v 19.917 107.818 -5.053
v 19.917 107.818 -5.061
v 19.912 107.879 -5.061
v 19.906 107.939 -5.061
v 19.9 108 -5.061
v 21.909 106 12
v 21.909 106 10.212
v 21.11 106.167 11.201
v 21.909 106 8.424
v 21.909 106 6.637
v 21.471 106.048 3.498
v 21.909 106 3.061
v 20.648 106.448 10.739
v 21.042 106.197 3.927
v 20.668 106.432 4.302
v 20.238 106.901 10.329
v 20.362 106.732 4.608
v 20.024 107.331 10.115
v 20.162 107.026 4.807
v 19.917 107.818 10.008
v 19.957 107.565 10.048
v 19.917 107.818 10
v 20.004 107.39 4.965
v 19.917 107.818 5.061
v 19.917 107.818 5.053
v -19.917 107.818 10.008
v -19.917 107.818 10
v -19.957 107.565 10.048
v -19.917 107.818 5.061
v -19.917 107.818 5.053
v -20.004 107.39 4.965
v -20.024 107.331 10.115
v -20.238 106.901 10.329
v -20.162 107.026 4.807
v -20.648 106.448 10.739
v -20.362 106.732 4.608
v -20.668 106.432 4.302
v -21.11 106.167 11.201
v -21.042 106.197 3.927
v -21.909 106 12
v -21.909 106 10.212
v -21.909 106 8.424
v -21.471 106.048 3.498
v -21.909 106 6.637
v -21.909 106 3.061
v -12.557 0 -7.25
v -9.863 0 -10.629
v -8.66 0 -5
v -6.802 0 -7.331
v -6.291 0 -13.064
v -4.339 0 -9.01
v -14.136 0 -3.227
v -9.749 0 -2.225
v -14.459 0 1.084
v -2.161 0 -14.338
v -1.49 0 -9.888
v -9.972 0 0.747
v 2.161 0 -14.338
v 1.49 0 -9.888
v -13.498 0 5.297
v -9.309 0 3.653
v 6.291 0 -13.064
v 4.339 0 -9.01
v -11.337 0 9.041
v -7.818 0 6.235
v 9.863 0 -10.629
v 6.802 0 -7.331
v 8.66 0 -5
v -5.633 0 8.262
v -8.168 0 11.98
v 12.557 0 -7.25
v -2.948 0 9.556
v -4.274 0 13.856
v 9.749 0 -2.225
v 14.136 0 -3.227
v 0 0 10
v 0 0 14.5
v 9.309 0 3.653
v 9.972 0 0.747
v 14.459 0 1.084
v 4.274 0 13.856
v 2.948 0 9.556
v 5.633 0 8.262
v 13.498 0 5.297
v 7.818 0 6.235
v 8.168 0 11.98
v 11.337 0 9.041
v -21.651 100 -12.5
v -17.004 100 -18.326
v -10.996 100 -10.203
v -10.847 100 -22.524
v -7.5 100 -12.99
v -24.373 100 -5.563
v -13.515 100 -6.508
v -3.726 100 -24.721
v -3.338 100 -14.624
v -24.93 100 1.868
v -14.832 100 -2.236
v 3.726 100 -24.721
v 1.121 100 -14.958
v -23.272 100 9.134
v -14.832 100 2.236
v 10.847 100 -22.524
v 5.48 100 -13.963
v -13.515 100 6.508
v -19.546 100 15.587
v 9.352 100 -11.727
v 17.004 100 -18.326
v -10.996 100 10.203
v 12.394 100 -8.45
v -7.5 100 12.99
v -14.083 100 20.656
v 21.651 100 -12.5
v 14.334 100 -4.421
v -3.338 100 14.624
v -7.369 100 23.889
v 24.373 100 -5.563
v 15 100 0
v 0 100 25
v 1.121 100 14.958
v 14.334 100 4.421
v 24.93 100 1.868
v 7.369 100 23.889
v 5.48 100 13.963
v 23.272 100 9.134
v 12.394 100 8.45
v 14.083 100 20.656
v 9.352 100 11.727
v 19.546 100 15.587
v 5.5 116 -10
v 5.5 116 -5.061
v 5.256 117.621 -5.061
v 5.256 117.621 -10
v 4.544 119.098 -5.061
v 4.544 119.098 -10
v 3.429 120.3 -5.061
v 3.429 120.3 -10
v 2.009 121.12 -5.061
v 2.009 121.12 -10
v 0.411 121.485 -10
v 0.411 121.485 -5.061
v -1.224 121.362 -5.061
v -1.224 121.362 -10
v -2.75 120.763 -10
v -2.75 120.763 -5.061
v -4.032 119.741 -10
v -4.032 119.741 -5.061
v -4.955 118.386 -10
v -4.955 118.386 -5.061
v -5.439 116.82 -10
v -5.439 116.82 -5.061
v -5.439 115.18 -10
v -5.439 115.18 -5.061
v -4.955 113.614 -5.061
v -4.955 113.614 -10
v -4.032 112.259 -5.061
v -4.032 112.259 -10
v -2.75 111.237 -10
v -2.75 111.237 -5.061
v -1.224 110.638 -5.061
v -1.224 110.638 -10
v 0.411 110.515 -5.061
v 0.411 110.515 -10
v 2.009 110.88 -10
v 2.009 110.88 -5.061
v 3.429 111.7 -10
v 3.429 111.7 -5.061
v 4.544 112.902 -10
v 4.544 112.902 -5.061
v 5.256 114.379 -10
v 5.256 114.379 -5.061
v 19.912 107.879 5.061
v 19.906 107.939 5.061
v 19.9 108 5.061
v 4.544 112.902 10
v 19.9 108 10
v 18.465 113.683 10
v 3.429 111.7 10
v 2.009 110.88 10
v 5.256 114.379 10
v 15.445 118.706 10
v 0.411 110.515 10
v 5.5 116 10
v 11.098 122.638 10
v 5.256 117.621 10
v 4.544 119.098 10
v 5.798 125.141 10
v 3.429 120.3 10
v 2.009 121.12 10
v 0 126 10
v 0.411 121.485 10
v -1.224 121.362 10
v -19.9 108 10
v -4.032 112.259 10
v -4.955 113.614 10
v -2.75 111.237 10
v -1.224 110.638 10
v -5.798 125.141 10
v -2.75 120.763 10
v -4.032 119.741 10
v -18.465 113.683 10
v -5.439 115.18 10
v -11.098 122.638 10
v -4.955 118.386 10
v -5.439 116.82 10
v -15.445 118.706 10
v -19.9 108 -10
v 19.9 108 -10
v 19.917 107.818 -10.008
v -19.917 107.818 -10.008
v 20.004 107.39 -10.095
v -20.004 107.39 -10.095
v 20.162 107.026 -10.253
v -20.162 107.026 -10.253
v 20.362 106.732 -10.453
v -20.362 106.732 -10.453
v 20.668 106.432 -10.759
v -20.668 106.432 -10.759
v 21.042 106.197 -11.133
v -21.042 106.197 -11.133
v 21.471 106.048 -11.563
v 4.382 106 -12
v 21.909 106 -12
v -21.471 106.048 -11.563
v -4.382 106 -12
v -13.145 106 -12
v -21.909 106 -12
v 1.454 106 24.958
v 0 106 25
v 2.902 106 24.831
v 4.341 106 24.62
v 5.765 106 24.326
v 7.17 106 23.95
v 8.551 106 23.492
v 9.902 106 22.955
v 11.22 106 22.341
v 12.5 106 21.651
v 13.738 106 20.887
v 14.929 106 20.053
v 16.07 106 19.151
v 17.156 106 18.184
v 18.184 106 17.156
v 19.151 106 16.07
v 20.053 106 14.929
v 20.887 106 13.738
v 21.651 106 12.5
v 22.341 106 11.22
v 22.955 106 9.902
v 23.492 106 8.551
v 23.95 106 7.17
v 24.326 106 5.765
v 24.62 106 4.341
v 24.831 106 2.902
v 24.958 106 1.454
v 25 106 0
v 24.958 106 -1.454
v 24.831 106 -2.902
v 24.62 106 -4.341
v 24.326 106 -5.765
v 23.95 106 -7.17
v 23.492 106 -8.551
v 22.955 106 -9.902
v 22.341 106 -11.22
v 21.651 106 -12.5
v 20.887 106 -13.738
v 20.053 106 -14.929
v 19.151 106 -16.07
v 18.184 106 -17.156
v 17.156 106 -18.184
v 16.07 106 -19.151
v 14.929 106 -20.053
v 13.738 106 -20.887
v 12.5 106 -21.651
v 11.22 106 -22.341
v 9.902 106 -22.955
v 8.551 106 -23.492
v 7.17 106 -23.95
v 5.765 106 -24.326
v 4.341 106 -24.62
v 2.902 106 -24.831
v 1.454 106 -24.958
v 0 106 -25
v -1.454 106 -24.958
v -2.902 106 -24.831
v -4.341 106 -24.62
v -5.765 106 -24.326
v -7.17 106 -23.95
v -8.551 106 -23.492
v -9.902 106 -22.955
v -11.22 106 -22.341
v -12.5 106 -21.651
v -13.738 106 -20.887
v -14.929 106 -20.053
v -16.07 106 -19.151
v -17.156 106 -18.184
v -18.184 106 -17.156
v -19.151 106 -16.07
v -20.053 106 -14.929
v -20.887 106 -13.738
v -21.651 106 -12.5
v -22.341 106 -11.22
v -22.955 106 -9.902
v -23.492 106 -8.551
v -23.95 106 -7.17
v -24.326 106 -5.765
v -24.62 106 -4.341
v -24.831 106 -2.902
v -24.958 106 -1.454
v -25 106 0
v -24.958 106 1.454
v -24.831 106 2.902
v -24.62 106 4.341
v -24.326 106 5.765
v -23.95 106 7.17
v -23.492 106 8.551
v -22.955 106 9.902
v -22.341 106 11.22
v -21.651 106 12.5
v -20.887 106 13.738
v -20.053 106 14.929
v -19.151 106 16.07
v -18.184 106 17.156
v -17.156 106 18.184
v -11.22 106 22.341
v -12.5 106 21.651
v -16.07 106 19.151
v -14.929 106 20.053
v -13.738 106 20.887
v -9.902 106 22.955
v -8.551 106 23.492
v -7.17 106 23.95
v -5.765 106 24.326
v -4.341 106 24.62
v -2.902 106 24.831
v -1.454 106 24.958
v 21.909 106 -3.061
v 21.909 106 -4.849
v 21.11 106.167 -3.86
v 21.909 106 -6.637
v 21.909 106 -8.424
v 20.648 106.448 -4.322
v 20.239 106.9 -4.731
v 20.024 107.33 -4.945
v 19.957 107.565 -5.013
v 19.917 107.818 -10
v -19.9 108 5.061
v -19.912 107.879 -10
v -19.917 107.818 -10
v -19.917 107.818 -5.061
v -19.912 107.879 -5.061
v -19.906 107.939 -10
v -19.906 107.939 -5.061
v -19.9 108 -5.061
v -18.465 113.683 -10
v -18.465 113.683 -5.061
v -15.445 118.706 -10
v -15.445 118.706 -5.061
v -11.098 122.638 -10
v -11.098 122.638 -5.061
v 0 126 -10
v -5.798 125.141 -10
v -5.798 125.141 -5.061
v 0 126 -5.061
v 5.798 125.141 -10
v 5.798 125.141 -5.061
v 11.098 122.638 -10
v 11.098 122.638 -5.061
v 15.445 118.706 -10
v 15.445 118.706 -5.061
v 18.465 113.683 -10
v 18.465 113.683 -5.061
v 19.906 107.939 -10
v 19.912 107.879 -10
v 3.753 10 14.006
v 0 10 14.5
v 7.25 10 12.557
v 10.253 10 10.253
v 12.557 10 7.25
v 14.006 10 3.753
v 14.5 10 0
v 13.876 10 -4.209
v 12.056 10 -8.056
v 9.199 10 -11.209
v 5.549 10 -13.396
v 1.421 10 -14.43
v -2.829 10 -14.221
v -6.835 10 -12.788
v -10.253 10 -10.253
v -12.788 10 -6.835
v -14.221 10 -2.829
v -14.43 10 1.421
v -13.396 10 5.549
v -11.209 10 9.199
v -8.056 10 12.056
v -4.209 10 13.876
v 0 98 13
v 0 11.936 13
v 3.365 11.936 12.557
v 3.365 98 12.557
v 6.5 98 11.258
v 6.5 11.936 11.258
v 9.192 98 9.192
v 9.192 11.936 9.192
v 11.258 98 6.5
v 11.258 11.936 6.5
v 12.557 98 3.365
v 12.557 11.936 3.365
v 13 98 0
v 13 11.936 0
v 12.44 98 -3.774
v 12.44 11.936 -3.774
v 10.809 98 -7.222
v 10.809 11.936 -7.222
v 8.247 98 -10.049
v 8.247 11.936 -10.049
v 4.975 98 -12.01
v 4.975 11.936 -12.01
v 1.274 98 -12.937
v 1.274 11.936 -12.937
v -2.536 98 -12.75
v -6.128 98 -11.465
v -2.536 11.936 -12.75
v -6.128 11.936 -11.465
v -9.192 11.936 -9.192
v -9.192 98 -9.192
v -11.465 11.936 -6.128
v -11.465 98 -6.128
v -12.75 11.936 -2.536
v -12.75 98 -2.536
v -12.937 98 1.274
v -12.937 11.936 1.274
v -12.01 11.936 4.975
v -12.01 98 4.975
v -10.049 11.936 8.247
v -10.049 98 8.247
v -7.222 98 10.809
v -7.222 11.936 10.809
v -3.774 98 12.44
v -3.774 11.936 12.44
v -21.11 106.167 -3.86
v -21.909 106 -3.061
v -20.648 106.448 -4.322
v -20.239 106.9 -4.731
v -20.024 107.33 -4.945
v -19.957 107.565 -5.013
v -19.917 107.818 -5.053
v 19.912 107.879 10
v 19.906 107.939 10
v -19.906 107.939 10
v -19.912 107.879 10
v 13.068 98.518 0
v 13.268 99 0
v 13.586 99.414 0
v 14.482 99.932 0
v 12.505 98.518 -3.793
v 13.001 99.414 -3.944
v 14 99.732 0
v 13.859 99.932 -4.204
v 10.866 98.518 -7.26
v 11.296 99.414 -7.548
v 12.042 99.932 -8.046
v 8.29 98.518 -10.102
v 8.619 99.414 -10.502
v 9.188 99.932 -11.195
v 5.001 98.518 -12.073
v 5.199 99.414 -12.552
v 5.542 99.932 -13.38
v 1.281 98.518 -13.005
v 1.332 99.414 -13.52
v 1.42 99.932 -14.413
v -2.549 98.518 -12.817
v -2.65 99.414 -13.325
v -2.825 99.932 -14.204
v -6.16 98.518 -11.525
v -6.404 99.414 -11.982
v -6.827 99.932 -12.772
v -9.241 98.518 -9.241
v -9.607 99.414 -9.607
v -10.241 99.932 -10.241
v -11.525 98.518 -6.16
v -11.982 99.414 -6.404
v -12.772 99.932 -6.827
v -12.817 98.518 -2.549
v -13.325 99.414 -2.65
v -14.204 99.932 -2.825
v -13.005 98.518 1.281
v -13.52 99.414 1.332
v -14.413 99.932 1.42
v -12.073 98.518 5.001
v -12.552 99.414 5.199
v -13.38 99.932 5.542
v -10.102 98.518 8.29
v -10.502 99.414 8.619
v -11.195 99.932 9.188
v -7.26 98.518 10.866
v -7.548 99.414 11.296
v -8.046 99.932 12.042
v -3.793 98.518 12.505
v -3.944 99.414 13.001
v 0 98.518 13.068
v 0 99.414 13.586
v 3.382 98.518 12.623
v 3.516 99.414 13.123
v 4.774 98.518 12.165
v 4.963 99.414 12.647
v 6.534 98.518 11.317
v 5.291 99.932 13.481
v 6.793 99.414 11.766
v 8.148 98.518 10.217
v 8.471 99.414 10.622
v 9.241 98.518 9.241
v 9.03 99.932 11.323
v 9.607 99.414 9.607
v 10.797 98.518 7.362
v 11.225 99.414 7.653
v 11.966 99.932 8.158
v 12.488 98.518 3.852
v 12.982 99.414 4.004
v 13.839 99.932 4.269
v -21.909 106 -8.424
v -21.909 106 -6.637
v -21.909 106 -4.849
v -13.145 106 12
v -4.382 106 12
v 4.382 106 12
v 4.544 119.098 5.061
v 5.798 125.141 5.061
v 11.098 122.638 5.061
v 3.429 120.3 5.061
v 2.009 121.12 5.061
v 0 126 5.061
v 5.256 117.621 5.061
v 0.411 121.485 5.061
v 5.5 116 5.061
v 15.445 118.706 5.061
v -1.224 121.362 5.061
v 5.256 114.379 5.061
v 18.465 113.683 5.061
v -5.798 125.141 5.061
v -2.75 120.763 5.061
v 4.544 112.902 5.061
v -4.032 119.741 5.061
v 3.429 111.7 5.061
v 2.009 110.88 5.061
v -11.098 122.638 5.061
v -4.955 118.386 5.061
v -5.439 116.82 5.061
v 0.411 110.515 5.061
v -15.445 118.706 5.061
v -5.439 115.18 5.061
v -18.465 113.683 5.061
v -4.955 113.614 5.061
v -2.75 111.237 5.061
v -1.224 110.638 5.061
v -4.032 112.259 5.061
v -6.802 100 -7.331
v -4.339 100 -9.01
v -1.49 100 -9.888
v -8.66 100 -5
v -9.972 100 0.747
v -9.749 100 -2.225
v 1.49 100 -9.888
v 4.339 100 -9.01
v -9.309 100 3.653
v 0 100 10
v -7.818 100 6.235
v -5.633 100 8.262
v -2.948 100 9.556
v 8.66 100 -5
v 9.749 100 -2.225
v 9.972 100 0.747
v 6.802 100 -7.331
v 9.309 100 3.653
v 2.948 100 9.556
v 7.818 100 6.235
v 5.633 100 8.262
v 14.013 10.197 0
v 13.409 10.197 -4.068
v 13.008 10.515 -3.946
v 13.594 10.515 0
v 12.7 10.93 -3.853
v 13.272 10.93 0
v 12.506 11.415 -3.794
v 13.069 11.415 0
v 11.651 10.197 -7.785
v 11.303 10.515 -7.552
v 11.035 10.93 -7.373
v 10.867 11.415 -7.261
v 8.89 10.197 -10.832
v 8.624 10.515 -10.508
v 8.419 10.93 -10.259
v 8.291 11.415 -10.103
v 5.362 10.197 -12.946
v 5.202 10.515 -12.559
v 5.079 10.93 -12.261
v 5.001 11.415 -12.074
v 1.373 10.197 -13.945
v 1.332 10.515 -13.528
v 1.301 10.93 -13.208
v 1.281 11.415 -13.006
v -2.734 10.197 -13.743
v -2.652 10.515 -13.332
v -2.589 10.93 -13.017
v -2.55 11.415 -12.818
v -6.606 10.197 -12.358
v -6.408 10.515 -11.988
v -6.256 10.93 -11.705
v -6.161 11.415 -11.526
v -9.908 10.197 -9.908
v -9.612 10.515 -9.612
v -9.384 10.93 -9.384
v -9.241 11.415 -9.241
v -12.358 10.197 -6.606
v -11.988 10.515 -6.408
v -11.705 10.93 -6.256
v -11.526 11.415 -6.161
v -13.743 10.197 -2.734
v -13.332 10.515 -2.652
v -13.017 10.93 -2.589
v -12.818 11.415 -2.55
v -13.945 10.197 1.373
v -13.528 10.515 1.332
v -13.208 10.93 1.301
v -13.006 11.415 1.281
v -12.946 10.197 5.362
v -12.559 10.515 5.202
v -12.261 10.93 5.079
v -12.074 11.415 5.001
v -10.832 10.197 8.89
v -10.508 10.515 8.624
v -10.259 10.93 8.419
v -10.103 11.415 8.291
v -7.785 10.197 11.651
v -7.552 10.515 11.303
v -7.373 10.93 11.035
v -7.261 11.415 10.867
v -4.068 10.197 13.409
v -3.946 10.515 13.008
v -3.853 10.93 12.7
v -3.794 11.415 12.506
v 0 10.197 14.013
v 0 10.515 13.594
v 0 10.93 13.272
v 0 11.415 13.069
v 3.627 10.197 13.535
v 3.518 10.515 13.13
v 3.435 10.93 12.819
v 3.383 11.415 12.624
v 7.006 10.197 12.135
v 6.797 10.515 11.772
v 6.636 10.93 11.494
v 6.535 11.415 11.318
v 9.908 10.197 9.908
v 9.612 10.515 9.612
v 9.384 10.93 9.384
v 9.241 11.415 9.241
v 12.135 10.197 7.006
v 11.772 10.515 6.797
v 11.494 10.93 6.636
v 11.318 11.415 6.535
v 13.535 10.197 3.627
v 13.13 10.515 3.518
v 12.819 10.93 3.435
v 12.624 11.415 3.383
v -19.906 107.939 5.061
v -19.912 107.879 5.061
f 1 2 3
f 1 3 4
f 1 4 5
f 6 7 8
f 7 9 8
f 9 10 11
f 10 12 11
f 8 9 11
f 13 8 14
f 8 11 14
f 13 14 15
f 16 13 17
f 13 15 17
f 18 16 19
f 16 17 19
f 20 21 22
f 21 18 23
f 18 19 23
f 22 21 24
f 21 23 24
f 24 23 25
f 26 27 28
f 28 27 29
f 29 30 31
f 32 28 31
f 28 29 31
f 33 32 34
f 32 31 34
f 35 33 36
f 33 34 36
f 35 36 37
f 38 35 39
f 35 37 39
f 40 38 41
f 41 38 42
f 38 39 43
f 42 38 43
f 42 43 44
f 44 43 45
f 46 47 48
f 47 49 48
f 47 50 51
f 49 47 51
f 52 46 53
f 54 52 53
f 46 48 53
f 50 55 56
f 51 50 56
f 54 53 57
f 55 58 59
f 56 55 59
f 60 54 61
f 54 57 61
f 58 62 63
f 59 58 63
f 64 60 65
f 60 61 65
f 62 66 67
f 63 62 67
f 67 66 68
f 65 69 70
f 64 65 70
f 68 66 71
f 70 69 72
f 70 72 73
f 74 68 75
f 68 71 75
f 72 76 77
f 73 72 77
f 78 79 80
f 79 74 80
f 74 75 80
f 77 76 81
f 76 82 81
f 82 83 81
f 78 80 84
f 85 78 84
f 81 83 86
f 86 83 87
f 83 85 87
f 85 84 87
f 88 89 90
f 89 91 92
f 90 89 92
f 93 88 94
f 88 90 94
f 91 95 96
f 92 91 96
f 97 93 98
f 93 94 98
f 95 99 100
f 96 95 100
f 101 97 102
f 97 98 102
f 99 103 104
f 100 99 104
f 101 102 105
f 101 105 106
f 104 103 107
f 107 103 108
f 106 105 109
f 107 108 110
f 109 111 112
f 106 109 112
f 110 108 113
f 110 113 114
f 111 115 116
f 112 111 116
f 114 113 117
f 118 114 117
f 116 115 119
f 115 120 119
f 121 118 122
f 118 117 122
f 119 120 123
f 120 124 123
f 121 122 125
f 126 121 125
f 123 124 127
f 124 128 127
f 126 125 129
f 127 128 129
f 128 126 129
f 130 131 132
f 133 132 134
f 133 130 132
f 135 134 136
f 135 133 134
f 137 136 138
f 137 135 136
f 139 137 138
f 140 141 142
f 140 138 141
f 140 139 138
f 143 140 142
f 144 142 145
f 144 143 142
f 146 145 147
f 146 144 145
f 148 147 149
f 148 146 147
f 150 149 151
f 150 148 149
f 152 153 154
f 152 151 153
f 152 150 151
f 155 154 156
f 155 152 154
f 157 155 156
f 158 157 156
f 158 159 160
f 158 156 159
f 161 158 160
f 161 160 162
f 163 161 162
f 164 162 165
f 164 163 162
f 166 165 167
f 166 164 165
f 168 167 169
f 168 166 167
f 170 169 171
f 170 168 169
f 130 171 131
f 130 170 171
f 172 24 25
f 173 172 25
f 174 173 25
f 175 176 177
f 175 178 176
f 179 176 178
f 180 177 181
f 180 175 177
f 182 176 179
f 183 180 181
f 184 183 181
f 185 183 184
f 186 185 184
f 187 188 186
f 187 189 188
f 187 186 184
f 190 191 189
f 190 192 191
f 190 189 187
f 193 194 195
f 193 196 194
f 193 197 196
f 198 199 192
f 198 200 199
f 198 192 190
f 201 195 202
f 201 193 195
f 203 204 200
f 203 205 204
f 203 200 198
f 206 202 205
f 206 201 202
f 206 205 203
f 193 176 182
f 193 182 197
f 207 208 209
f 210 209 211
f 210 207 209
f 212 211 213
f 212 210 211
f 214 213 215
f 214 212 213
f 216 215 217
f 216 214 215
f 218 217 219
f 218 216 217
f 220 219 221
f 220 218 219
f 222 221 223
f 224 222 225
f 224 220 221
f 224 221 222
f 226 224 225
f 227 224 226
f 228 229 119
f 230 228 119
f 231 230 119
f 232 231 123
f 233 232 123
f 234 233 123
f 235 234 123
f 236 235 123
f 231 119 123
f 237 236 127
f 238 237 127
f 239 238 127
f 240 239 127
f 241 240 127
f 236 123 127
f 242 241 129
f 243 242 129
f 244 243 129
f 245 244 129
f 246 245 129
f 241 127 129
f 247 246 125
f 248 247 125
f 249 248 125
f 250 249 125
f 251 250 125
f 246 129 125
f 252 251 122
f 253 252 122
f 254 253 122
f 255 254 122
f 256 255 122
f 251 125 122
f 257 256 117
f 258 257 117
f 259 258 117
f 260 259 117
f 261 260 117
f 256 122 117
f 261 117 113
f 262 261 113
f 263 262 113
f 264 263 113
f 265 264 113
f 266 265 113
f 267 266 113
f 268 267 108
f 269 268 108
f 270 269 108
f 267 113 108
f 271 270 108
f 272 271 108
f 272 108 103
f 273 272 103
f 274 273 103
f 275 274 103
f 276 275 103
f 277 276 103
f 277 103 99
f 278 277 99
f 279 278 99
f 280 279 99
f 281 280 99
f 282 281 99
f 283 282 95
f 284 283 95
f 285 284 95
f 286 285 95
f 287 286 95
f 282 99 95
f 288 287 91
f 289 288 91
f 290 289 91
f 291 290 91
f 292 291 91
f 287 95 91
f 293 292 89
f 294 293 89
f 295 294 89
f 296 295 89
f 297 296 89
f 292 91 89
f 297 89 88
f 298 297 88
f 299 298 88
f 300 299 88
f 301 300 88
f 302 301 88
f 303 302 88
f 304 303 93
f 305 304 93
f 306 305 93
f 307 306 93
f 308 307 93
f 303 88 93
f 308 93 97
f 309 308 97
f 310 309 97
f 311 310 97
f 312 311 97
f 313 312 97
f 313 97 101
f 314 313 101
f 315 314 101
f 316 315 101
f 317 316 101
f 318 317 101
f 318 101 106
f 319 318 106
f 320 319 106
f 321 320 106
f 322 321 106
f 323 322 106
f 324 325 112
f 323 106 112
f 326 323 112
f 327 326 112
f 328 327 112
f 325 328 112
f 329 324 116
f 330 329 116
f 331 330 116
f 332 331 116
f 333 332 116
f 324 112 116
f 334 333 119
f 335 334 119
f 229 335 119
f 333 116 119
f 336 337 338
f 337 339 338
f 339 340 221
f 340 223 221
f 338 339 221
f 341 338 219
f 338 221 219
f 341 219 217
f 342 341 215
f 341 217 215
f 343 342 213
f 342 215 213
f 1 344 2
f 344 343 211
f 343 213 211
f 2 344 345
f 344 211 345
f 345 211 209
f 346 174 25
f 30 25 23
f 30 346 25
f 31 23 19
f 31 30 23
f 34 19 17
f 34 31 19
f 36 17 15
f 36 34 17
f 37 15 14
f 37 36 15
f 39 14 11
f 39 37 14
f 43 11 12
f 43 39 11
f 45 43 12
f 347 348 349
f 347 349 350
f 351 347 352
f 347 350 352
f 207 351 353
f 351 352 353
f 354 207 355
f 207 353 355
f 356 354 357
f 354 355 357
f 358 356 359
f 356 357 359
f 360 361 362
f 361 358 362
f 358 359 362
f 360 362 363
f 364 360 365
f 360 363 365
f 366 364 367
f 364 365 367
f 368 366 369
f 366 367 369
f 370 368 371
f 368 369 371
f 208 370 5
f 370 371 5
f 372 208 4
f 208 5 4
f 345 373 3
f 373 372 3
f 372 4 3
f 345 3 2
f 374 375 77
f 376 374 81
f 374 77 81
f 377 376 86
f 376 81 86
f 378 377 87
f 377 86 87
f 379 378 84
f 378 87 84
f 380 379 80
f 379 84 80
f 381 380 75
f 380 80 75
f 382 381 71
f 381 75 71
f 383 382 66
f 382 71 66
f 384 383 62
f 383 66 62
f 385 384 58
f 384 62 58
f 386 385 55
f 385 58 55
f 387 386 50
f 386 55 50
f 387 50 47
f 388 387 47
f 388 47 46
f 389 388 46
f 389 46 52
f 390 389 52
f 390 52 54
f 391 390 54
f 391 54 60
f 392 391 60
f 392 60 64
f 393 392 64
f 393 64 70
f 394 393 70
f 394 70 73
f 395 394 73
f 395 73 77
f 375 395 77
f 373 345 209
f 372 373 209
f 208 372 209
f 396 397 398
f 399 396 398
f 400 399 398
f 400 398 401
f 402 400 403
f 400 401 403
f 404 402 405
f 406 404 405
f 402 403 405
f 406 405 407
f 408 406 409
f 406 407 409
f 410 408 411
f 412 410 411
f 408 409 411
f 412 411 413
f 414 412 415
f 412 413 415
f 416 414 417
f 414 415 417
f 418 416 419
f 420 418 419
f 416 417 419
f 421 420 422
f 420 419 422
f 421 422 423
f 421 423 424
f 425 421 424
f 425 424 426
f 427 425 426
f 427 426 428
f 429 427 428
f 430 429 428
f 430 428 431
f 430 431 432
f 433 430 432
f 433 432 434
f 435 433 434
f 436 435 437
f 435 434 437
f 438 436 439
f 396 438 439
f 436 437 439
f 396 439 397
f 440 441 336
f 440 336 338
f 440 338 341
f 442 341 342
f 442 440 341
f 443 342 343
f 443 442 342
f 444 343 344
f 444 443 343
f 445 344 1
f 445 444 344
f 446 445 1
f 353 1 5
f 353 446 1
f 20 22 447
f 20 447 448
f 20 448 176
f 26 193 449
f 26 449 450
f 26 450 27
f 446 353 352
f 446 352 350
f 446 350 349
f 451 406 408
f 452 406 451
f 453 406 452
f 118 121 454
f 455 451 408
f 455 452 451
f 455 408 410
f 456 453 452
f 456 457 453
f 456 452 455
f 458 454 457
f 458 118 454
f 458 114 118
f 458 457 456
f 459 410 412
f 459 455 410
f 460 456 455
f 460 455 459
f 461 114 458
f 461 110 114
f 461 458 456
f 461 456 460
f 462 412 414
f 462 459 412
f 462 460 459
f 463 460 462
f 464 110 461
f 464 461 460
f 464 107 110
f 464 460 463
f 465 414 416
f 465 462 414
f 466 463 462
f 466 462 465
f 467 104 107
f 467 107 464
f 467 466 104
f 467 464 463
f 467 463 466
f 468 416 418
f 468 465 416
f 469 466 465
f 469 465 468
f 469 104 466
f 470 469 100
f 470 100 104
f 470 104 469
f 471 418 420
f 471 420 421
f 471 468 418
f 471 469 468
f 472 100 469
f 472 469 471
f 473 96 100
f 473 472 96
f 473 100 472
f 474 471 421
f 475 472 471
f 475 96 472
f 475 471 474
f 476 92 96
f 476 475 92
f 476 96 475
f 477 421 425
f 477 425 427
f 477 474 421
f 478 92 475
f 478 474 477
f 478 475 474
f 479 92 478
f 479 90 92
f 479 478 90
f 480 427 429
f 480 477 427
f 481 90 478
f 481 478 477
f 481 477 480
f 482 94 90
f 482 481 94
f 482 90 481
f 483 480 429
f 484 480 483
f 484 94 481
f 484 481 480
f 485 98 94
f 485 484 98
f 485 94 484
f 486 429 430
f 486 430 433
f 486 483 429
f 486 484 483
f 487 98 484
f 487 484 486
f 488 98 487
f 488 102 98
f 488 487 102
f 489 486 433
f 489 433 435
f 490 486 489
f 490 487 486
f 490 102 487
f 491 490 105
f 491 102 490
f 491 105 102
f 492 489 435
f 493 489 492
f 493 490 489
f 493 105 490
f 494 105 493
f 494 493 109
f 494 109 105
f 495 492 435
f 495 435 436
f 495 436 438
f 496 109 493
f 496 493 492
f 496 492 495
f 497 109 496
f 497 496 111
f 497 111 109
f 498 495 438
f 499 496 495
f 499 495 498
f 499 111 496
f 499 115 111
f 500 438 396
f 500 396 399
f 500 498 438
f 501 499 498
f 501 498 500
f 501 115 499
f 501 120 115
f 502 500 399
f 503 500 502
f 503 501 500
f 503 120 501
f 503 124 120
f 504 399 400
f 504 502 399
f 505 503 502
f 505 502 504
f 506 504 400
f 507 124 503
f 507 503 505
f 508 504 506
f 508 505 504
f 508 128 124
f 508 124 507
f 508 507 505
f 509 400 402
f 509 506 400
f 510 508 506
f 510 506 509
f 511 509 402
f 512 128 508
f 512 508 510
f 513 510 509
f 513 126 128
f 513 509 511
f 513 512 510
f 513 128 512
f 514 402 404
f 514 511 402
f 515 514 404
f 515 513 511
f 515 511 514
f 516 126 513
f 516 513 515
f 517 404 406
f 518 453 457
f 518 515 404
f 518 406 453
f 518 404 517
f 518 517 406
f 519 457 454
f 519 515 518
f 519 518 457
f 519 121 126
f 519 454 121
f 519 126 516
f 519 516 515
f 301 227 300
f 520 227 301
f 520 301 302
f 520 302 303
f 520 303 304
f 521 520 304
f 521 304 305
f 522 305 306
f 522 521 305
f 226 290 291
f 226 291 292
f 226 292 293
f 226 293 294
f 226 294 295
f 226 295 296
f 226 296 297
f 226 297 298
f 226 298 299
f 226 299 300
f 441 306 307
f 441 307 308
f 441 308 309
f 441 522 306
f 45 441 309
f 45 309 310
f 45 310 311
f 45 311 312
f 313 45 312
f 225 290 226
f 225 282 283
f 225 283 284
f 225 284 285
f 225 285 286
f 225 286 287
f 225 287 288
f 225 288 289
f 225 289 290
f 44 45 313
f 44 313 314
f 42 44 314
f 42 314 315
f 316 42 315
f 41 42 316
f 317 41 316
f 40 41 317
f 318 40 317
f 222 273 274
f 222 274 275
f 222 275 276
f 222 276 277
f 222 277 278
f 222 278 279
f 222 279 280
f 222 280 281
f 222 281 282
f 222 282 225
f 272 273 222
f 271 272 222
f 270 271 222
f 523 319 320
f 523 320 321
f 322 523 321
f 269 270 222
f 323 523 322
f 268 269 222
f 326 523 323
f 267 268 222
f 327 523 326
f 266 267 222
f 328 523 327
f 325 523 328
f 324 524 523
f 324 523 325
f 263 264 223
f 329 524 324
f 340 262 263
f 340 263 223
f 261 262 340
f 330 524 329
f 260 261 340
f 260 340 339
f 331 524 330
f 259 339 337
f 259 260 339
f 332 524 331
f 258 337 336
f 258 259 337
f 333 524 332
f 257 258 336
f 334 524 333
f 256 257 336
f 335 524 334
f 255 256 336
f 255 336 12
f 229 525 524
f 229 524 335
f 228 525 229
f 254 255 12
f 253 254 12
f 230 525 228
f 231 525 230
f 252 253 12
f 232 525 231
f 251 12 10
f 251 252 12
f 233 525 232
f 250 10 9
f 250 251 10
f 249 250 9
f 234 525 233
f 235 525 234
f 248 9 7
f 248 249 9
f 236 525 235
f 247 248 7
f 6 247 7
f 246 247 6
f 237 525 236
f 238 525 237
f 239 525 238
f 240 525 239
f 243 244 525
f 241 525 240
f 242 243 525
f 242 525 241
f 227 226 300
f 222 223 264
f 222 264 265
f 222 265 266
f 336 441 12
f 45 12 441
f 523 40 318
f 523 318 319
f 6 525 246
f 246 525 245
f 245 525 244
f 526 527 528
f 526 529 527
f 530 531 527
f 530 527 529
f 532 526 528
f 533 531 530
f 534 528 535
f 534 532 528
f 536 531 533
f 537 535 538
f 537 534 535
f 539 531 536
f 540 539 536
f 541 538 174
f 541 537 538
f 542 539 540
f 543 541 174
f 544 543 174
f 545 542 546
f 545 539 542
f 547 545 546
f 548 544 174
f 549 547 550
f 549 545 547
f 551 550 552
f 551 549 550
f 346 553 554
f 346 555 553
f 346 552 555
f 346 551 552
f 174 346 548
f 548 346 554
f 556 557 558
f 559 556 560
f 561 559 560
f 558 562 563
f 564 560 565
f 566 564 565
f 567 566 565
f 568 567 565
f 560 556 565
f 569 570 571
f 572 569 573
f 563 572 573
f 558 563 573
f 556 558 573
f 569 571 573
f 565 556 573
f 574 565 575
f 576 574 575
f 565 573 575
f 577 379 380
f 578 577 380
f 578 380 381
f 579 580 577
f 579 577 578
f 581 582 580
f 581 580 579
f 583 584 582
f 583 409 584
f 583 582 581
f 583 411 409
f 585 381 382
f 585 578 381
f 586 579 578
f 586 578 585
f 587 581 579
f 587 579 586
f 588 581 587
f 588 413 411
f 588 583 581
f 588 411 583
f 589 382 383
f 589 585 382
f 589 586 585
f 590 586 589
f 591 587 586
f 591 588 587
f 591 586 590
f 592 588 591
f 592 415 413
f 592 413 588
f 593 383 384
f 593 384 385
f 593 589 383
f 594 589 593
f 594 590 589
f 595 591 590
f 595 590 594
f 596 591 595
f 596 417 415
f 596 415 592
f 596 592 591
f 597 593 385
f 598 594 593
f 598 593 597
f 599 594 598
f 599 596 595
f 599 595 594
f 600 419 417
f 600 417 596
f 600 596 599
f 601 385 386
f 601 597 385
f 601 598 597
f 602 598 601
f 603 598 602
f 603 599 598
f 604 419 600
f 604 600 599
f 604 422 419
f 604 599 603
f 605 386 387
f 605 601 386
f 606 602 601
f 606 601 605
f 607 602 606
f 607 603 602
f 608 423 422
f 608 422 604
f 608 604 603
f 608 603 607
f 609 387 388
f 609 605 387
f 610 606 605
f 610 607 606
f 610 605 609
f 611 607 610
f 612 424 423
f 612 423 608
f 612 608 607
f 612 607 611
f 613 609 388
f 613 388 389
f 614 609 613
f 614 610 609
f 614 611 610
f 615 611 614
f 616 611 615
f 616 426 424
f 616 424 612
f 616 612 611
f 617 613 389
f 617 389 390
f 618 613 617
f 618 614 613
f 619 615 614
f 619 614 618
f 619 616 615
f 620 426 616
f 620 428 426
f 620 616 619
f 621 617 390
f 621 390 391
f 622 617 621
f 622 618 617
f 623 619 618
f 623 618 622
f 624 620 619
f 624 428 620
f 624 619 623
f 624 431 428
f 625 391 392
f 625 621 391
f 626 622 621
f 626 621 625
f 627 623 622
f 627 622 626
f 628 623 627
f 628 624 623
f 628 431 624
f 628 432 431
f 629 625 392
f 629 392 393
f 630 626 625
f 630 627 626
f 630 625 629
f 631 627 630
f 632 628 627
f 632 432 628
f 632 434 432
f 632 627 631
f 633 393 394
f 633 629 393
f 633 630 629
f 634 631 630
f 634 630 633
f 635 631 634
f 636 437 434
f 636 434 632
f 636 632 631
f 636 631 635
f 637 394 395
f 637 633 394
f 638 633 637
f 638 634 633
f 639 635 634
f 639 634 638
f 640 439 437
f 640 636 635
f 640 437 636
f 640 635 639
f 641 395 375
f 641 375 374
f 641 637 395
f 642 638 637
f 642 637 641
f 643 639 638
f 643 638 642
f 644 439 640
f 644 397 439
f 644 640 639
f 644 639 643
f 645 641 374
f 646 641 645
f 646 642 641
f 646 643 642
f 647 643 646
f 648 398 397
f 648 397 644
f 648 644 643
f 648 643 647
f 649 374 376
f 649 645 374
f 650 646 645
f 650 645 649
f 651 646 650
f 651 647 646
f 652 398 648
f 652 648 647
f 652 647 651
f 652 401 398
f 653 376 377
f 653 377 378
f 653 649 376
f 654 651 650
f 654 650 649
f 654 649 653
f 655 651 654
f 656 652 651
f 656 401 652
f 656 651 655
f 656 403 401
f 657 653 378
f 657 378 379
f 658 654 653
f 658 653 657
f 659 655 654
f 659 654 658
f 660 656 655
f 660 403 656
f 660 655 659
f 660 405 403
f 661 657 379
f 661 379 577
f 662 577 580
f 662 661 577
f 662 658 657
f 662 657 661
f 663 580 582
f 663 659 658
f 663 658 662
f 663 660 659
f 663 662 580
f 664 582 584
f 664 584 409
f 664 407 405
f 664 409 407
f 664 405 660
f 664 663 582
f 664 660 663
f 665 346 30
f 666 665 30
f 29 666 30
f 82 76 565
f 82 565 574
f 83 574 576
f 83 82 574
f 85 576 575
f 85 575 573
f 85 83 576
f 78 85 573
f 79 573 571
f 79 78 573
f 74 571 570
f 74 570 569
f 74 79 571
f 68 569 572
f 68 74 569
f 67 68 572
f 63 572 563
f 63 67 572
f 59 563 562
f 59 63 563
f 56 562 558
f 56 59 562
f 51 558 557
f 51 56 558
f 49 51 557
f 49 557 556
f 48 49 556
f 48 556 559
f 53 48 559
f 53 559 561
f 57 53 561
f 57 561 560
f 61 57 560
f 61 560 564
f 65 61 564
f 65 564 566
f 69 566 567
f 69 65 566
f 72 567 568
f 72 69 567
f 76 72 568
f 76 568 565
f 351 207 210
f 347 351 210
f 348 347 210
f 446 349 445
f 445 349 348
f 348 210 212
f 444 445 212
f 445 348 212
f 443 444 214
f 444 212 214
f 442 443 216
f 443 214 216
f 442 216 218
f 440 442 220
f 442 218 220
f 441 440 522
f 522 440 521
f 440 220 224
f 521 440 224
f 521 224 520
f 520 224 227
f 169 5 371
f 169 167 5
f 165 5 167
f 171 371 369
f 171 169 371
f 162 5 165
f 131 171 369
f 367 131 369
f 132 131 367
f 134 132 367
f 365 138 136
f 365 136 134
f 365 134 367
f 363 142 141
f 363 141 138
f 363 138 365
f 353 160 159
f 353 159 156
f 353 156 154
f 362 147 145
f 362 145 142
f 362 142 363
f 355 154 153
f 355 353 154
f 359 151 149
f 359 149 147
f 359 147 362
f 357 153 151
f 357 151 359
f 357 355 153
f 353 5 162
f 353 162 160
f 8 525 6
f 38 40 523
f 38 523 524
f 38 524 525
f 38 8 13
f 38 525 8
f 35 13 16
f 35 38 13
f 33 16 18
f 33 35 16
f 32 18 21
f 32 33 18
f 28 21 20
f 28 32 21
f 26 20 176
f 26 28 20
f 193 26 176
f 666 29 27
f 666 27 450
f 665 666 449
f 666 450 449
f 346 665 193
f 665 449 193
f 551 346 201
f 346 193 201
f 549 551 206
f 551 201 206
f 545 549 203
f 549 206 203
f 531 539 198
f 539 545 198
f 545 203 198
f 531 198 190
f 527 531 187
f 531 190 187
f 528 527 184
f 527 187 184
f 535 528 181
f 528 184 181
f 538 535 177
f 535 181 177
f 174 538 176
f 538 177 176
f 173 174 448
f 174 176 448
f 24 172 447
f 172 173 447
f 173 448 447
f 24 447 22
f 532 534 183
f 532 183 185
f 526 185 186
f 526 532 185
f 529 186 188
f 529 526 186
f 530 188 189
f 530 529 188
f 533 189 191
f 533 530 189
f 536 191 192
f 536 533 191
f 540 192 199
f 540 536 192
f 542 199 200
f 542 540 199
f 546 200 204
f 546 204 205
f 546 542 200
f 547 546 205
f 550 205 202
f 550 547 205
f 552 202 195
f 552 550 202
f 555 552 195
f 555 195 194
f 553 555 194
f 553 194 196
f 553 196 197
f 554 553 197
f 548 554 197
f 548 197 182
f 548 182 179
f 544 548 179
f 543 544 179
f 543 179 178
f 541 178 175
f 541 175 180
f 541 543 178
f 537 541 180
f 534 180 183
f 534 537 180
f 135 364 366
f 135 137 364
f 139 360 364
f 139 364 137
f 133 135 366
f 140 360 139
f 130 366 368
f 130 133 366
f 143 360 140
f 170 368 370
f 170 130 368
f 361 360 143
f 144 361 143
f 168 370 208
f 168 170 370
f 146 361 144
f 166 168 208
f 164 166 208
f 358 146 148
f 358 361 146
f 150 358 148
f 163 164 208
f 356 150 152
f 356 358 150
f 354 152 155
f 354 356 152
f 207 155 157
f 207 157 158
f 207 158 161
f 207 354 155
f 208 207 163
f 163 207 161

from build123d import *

# Parameters (mm, degrees)
SKETCH2_R            = 13
SKETCH2_R_2          = 10
BOSS_EXTRUDE3_DEPTH  = 100
SKETCH2_3_R          = 14.5
SKETCH2_3_R_2        = 13
BOSS_EXTRUDE5_DEPTH  = 10
SKETCH8_R            = 25
BOSS_EXTRUDE7_DEPTH  = 6
SKETCH11_R           = 5.5
BOSS_EXTRUDE12_DEPTH = 10
SKETCH14_W           = 47.941155358
SKETCH14_H           = 10.12177459
CUT_EXTRUDE2_DEPTH   = 112.740771431
FILLET1_START        = -12.0000001
FILLET1_2_DEPTH      = 2.0000001
FILLET1_START_2      = 3.060887195
FILLET1_3_DEPTH      = 2.0000001
FILLET1_START_3      = -5.060887295
FILLET1_4_DEPTH      = 2
FILLET1_START_4      = 10
FILLET1_5_DEPTH      = 2
FILLET1_START_5      = -10
FILLET1_6_DEPTH      = 4.939112705
FILLET1_START_6      = 5.060887295
FILLET1_7_DEPTH      = 4.939112705
FILLET1_START_7      = -21.9089024
FILLET1_8_DEPTH      = 43.8178047


with BuildPart() as part:
    # Sketch2 → Boss-Extrude3 (new body)
    with BuildSketch(Plane(origin=(0, 0, 0), x_dir=(1, 0, 0), z_dir=(0, 1, 0))):
        with Locations(Location((0, 0, 0), (0, 0, 270))):
            Circle(SKETCH2_R)
        with Locations(Location((0, 0, 0), (0, 0, 270))):
            Circle(SKETCH2_R_2, mode=Mode.SUBTRACT)
    extrude(amount=BOSS_EXTRUDE3_DEPTH)

    # Sketch2<3> → Boss-Extrude5 (add)
    with BuildSketch(Plane(origin=(0, 0, 0), x_dir=(1, 0, 0), z_dir=(0, 1, 0))):
        with Locations(Location((0, 0, 0), (0, 0, 270))):
            Circle(SKETCH2_3_R)
        with Locations(Location((0, 0, 0), (0, 0, 270))):
            Circle(SKETCH2_3_R_2, mode=Mode.SUBTRACT)
    extrude(amount=BOSS_EXTRUDE5_DEPTH)

    # Sketch8 → Boss-Extrude7 (add)
    with BuildSketch(Plane(origin=(0, 100, 0), x_dir=(1, 0, 0), z_dir=(0, 1, 0))):
        with Locations(Location((0, 0, 0), (0, 0, 270))):
            Circle(SKETCH8_R)
    extrude(amount=BOSS_EXTRUDE7_DEPTH)

    # Sketch11 → Boss-Extrude12 (add, symmetric)
    with BuildSketch(Plane.XY):
        with BuildLine():
            Line((20, 106), (-20, 106))
            ThreePointArc((-20, 106), (0, 126), (20, 106))
        make_face()
        with Locations((0, 116)):
            Circle(SKETCH11_R, mode=Mode.SUBTRACT)
    extrude(amount=BOSS_EXTRUDE12_DEPTH, both=True)

    # Sketch14 → Cut-Extrude2 (cut, through all)
    with BuildSketch(Plane(origin=(0, 106, 0), x_dir=(1, 0, 0), z_dir=(0, 1, 0))):
        Rectangle(SKETCH14_W, SKETCH14_H)
    extrude(amount=CUT_EXTRUDE2_DEPTH, mode=Mode.SUBTRACT)

    # Fillet1: read off the stored shape, not the designer's step
    # Fillet1 outline → Fillet1 (revolve)
    with BuildSketch(Plane.XY):
        with BuildLine():
            Line((15, 100), (13, 100))
            Line((13, 100), (13, 98))
            ThreePointArc((13, 98), (13.585786438, 99.414213562), (15, 100))
        make_face()
        with BuildLine():
            ThreePointArc((14.5, 10), (13.41886117, 10.711746802), (13, 11.936491673))
            Line((13, 11.936491673), (13, 10))
            Line((13, 10), (14.5, 10))
        make_face()
    revolve(axis=Axis((0, 0, 0), (0, 1, 0)))

    # Fillet1 2 outline → Fillet1 2 (add)
    with BuildSketch(Plane.XY.offset(FILLET1_START)):
        with BuildLine():
            ThreePointArc((21.9089023, 106), (20.560502575, 106.522902108), (19.917183909, 107.818181818))
            ThreePointArc((19.917183909, 107.818181818), (0, 126), (-19.917183909, 107.818181818))
            ThreePointArc((-19.917183909, 107.818181818), (-20.560502575, 106.522902108), (-21.9089023, 106))
            Line((-21.9089023, 106), (21.9089023, 106))
        make_face()
    extrude(amount=FILLET1_2_DEPTH)

    # Fillet1 3 outline → Fillet1 3 (add)
    with BuildSketch(Plane.XY.offset(FILLET1_START_2)):
        with BuildLine():
            ThreePointArc((21.9089023, 106), (20.560502575, 106.522902108), (19.917183909, 107.818181818))
            ThreePointArc((19.917183909, 107.818181818), (0, 126), (-19.917183909, 107.818181818))
            ThreePointArc((-19.917183909, 107.818181818), (-20.560502575, 106.522902108), (-21.9089023, 106))
            Line((-21.9089023, 106), (21.9089023, 106))
        make_face()
    extrude(amount=FILLET1_3_DEPTH)

    # Fillet1 4 outline → Fillet1 4 (add)
    with BuildSketch(Plane.XY.offset(FILLET1_START_3)):
        with BuildLine():
            ThreePointArc((21.9089023, 106), (20.560502575, 106.522902108), (19.917183909, 107.818181818))
            ThreePointArc((19.917183909, 107.818181818), (0, 126), (-19.917183909, 107.818181818))
            ThreePointArc((-19.917183909, 107.818181818), (-20.560502575, 106.522902108), (-21.9089023, 106))
            Line((-21.9089023, 106), (21.9089023, 106))
        make_face()
    extrude(amount=FILLET1_4_DEPTH)

    # Fillet1 5 outline → Fillet1 5 (add)
    with BuildSketch(Plane.XY.offset(FILLET1_START_4)):
        with BuildLine():
            ThreePointArc((21.9089023, 106), (20.560502575, 106.522902108), (19.917183909, 107.818181818))
            ThreePointArc((19.917183909, 107.818181818), (0, 126), (-19.917183909, 107.818181818))
            ThreePointArc((-19.917183909, 107.818181818), (-20.560502575, 106.522902108), (-21.9089023, 106))
            Line((-21.9089023, 106), (21.9089023, 106))
        make_face()
    extrude(amount=FILLET1_5_DEPTH)

    # Fillet1 6 outline → Fillet1 6 (add)
    with BuildSketch(Plane.XY.offset(FILLET1_START_5)):
        with BuildLine():
            Line((20, 106), (21.9089023, 106))
            ThreePointArc((21.9089023, 106), (20.560502575, 106.522902108), (19.917183909, 107.818181818))
            ThreePointArc((19.917183909, 107.818181818), (19.97928525, 106.910033465), (20, 106))
        make_face()
        with BuildLine():
            ThreePointArc((-20, 106), (-19.97928525, 106.910033465), (-19.917183909, 107.818181818))
            ThreePointArc((-19.917183909, 107.818181818), (-20.560502575, 106.522902108), (-21.9089023, 106))
            Line((-21.9089023, 106), (-20, 106))
        make_face()
    extrude(amount=FILLET1_6_DEPTH)

    # Fillet1 7 outline → Fillet1 7 (add)
    with BuildSketch(Plane.XY.offset(FILLET1_START_6)):
        with BuildLine():
            Line((20, 106), (21.9089023, 106))
            ThreePointArc((21.9089023, 106), (20.560502575, 106.522902108), (19.917183909, 107.818181818))
            ThreePointArc((19.917183909, 107.818181818), (19.97928525, 106.910033465), (20, 106))
        make_face()
        with BuildLine():
            ThreePointArc((-20, 106), (-19.97928525, 106.910033465), (-19.917183909, 107.818181818))
            ThreePointArc((-19.917183909, 107.818181818), (-20.560502575, 106.522902108), (-21.9089023, 106))
            Line((-21.9089023, 106), (-20, 106))
        make_face()
    extrude(amount=FILLET1_7_DEPTH)

    # Fillet1 8 outline → Fillet1 8 (cut)
    with BuildSketch(Plane.YZ.offset(FILLET1_START_7)):
        with BuildLine():
            Line((108, 10), (127, 10))
            Line((127, 10), (127, 12))
            Line((127, 12), (106, 12))
            ThreePointArc((106, 12), (106.585786438, 10.585786438), (108, 10))
        make_face()
        with BuildLine():
            Line((127, 3.060887195), (127, 5.060887295))
            Line((127, 5.060887295), (108, 5.060887295))
            ThreePointArc((108, 5.060887295), (106.585786438, 4.475100858), (106, 3.060887295))
            Line((106, 3.060887295), (127, 3.060887195))
        make_face()
        with BuildLine():
            Line((127, -5.060887295), (127, -3.060887295))
            Line((127, -3.060887295), (106, -3.060887295))
            ThreePointArc((106, -3.060887295), (106.585786438, -4.475100858), (108, -5.060887295))
            Line((108, -5.060887295), (127, -5.060887295))
        make_face()
        with BuildLine():
            Line((127, -12.0000001), (127, -10))
            Line((127, -10), (108, -10))
            ThreePointArc((108, -10), (106.585786438, -10.585786438), (106, -12))
            Line((106, -12), (127, -12.0000001))
        make_face()
    extrude(amount=FILLET1_8_DEPTH, mode=Mode.SUBTRACT)


solid = part.part
